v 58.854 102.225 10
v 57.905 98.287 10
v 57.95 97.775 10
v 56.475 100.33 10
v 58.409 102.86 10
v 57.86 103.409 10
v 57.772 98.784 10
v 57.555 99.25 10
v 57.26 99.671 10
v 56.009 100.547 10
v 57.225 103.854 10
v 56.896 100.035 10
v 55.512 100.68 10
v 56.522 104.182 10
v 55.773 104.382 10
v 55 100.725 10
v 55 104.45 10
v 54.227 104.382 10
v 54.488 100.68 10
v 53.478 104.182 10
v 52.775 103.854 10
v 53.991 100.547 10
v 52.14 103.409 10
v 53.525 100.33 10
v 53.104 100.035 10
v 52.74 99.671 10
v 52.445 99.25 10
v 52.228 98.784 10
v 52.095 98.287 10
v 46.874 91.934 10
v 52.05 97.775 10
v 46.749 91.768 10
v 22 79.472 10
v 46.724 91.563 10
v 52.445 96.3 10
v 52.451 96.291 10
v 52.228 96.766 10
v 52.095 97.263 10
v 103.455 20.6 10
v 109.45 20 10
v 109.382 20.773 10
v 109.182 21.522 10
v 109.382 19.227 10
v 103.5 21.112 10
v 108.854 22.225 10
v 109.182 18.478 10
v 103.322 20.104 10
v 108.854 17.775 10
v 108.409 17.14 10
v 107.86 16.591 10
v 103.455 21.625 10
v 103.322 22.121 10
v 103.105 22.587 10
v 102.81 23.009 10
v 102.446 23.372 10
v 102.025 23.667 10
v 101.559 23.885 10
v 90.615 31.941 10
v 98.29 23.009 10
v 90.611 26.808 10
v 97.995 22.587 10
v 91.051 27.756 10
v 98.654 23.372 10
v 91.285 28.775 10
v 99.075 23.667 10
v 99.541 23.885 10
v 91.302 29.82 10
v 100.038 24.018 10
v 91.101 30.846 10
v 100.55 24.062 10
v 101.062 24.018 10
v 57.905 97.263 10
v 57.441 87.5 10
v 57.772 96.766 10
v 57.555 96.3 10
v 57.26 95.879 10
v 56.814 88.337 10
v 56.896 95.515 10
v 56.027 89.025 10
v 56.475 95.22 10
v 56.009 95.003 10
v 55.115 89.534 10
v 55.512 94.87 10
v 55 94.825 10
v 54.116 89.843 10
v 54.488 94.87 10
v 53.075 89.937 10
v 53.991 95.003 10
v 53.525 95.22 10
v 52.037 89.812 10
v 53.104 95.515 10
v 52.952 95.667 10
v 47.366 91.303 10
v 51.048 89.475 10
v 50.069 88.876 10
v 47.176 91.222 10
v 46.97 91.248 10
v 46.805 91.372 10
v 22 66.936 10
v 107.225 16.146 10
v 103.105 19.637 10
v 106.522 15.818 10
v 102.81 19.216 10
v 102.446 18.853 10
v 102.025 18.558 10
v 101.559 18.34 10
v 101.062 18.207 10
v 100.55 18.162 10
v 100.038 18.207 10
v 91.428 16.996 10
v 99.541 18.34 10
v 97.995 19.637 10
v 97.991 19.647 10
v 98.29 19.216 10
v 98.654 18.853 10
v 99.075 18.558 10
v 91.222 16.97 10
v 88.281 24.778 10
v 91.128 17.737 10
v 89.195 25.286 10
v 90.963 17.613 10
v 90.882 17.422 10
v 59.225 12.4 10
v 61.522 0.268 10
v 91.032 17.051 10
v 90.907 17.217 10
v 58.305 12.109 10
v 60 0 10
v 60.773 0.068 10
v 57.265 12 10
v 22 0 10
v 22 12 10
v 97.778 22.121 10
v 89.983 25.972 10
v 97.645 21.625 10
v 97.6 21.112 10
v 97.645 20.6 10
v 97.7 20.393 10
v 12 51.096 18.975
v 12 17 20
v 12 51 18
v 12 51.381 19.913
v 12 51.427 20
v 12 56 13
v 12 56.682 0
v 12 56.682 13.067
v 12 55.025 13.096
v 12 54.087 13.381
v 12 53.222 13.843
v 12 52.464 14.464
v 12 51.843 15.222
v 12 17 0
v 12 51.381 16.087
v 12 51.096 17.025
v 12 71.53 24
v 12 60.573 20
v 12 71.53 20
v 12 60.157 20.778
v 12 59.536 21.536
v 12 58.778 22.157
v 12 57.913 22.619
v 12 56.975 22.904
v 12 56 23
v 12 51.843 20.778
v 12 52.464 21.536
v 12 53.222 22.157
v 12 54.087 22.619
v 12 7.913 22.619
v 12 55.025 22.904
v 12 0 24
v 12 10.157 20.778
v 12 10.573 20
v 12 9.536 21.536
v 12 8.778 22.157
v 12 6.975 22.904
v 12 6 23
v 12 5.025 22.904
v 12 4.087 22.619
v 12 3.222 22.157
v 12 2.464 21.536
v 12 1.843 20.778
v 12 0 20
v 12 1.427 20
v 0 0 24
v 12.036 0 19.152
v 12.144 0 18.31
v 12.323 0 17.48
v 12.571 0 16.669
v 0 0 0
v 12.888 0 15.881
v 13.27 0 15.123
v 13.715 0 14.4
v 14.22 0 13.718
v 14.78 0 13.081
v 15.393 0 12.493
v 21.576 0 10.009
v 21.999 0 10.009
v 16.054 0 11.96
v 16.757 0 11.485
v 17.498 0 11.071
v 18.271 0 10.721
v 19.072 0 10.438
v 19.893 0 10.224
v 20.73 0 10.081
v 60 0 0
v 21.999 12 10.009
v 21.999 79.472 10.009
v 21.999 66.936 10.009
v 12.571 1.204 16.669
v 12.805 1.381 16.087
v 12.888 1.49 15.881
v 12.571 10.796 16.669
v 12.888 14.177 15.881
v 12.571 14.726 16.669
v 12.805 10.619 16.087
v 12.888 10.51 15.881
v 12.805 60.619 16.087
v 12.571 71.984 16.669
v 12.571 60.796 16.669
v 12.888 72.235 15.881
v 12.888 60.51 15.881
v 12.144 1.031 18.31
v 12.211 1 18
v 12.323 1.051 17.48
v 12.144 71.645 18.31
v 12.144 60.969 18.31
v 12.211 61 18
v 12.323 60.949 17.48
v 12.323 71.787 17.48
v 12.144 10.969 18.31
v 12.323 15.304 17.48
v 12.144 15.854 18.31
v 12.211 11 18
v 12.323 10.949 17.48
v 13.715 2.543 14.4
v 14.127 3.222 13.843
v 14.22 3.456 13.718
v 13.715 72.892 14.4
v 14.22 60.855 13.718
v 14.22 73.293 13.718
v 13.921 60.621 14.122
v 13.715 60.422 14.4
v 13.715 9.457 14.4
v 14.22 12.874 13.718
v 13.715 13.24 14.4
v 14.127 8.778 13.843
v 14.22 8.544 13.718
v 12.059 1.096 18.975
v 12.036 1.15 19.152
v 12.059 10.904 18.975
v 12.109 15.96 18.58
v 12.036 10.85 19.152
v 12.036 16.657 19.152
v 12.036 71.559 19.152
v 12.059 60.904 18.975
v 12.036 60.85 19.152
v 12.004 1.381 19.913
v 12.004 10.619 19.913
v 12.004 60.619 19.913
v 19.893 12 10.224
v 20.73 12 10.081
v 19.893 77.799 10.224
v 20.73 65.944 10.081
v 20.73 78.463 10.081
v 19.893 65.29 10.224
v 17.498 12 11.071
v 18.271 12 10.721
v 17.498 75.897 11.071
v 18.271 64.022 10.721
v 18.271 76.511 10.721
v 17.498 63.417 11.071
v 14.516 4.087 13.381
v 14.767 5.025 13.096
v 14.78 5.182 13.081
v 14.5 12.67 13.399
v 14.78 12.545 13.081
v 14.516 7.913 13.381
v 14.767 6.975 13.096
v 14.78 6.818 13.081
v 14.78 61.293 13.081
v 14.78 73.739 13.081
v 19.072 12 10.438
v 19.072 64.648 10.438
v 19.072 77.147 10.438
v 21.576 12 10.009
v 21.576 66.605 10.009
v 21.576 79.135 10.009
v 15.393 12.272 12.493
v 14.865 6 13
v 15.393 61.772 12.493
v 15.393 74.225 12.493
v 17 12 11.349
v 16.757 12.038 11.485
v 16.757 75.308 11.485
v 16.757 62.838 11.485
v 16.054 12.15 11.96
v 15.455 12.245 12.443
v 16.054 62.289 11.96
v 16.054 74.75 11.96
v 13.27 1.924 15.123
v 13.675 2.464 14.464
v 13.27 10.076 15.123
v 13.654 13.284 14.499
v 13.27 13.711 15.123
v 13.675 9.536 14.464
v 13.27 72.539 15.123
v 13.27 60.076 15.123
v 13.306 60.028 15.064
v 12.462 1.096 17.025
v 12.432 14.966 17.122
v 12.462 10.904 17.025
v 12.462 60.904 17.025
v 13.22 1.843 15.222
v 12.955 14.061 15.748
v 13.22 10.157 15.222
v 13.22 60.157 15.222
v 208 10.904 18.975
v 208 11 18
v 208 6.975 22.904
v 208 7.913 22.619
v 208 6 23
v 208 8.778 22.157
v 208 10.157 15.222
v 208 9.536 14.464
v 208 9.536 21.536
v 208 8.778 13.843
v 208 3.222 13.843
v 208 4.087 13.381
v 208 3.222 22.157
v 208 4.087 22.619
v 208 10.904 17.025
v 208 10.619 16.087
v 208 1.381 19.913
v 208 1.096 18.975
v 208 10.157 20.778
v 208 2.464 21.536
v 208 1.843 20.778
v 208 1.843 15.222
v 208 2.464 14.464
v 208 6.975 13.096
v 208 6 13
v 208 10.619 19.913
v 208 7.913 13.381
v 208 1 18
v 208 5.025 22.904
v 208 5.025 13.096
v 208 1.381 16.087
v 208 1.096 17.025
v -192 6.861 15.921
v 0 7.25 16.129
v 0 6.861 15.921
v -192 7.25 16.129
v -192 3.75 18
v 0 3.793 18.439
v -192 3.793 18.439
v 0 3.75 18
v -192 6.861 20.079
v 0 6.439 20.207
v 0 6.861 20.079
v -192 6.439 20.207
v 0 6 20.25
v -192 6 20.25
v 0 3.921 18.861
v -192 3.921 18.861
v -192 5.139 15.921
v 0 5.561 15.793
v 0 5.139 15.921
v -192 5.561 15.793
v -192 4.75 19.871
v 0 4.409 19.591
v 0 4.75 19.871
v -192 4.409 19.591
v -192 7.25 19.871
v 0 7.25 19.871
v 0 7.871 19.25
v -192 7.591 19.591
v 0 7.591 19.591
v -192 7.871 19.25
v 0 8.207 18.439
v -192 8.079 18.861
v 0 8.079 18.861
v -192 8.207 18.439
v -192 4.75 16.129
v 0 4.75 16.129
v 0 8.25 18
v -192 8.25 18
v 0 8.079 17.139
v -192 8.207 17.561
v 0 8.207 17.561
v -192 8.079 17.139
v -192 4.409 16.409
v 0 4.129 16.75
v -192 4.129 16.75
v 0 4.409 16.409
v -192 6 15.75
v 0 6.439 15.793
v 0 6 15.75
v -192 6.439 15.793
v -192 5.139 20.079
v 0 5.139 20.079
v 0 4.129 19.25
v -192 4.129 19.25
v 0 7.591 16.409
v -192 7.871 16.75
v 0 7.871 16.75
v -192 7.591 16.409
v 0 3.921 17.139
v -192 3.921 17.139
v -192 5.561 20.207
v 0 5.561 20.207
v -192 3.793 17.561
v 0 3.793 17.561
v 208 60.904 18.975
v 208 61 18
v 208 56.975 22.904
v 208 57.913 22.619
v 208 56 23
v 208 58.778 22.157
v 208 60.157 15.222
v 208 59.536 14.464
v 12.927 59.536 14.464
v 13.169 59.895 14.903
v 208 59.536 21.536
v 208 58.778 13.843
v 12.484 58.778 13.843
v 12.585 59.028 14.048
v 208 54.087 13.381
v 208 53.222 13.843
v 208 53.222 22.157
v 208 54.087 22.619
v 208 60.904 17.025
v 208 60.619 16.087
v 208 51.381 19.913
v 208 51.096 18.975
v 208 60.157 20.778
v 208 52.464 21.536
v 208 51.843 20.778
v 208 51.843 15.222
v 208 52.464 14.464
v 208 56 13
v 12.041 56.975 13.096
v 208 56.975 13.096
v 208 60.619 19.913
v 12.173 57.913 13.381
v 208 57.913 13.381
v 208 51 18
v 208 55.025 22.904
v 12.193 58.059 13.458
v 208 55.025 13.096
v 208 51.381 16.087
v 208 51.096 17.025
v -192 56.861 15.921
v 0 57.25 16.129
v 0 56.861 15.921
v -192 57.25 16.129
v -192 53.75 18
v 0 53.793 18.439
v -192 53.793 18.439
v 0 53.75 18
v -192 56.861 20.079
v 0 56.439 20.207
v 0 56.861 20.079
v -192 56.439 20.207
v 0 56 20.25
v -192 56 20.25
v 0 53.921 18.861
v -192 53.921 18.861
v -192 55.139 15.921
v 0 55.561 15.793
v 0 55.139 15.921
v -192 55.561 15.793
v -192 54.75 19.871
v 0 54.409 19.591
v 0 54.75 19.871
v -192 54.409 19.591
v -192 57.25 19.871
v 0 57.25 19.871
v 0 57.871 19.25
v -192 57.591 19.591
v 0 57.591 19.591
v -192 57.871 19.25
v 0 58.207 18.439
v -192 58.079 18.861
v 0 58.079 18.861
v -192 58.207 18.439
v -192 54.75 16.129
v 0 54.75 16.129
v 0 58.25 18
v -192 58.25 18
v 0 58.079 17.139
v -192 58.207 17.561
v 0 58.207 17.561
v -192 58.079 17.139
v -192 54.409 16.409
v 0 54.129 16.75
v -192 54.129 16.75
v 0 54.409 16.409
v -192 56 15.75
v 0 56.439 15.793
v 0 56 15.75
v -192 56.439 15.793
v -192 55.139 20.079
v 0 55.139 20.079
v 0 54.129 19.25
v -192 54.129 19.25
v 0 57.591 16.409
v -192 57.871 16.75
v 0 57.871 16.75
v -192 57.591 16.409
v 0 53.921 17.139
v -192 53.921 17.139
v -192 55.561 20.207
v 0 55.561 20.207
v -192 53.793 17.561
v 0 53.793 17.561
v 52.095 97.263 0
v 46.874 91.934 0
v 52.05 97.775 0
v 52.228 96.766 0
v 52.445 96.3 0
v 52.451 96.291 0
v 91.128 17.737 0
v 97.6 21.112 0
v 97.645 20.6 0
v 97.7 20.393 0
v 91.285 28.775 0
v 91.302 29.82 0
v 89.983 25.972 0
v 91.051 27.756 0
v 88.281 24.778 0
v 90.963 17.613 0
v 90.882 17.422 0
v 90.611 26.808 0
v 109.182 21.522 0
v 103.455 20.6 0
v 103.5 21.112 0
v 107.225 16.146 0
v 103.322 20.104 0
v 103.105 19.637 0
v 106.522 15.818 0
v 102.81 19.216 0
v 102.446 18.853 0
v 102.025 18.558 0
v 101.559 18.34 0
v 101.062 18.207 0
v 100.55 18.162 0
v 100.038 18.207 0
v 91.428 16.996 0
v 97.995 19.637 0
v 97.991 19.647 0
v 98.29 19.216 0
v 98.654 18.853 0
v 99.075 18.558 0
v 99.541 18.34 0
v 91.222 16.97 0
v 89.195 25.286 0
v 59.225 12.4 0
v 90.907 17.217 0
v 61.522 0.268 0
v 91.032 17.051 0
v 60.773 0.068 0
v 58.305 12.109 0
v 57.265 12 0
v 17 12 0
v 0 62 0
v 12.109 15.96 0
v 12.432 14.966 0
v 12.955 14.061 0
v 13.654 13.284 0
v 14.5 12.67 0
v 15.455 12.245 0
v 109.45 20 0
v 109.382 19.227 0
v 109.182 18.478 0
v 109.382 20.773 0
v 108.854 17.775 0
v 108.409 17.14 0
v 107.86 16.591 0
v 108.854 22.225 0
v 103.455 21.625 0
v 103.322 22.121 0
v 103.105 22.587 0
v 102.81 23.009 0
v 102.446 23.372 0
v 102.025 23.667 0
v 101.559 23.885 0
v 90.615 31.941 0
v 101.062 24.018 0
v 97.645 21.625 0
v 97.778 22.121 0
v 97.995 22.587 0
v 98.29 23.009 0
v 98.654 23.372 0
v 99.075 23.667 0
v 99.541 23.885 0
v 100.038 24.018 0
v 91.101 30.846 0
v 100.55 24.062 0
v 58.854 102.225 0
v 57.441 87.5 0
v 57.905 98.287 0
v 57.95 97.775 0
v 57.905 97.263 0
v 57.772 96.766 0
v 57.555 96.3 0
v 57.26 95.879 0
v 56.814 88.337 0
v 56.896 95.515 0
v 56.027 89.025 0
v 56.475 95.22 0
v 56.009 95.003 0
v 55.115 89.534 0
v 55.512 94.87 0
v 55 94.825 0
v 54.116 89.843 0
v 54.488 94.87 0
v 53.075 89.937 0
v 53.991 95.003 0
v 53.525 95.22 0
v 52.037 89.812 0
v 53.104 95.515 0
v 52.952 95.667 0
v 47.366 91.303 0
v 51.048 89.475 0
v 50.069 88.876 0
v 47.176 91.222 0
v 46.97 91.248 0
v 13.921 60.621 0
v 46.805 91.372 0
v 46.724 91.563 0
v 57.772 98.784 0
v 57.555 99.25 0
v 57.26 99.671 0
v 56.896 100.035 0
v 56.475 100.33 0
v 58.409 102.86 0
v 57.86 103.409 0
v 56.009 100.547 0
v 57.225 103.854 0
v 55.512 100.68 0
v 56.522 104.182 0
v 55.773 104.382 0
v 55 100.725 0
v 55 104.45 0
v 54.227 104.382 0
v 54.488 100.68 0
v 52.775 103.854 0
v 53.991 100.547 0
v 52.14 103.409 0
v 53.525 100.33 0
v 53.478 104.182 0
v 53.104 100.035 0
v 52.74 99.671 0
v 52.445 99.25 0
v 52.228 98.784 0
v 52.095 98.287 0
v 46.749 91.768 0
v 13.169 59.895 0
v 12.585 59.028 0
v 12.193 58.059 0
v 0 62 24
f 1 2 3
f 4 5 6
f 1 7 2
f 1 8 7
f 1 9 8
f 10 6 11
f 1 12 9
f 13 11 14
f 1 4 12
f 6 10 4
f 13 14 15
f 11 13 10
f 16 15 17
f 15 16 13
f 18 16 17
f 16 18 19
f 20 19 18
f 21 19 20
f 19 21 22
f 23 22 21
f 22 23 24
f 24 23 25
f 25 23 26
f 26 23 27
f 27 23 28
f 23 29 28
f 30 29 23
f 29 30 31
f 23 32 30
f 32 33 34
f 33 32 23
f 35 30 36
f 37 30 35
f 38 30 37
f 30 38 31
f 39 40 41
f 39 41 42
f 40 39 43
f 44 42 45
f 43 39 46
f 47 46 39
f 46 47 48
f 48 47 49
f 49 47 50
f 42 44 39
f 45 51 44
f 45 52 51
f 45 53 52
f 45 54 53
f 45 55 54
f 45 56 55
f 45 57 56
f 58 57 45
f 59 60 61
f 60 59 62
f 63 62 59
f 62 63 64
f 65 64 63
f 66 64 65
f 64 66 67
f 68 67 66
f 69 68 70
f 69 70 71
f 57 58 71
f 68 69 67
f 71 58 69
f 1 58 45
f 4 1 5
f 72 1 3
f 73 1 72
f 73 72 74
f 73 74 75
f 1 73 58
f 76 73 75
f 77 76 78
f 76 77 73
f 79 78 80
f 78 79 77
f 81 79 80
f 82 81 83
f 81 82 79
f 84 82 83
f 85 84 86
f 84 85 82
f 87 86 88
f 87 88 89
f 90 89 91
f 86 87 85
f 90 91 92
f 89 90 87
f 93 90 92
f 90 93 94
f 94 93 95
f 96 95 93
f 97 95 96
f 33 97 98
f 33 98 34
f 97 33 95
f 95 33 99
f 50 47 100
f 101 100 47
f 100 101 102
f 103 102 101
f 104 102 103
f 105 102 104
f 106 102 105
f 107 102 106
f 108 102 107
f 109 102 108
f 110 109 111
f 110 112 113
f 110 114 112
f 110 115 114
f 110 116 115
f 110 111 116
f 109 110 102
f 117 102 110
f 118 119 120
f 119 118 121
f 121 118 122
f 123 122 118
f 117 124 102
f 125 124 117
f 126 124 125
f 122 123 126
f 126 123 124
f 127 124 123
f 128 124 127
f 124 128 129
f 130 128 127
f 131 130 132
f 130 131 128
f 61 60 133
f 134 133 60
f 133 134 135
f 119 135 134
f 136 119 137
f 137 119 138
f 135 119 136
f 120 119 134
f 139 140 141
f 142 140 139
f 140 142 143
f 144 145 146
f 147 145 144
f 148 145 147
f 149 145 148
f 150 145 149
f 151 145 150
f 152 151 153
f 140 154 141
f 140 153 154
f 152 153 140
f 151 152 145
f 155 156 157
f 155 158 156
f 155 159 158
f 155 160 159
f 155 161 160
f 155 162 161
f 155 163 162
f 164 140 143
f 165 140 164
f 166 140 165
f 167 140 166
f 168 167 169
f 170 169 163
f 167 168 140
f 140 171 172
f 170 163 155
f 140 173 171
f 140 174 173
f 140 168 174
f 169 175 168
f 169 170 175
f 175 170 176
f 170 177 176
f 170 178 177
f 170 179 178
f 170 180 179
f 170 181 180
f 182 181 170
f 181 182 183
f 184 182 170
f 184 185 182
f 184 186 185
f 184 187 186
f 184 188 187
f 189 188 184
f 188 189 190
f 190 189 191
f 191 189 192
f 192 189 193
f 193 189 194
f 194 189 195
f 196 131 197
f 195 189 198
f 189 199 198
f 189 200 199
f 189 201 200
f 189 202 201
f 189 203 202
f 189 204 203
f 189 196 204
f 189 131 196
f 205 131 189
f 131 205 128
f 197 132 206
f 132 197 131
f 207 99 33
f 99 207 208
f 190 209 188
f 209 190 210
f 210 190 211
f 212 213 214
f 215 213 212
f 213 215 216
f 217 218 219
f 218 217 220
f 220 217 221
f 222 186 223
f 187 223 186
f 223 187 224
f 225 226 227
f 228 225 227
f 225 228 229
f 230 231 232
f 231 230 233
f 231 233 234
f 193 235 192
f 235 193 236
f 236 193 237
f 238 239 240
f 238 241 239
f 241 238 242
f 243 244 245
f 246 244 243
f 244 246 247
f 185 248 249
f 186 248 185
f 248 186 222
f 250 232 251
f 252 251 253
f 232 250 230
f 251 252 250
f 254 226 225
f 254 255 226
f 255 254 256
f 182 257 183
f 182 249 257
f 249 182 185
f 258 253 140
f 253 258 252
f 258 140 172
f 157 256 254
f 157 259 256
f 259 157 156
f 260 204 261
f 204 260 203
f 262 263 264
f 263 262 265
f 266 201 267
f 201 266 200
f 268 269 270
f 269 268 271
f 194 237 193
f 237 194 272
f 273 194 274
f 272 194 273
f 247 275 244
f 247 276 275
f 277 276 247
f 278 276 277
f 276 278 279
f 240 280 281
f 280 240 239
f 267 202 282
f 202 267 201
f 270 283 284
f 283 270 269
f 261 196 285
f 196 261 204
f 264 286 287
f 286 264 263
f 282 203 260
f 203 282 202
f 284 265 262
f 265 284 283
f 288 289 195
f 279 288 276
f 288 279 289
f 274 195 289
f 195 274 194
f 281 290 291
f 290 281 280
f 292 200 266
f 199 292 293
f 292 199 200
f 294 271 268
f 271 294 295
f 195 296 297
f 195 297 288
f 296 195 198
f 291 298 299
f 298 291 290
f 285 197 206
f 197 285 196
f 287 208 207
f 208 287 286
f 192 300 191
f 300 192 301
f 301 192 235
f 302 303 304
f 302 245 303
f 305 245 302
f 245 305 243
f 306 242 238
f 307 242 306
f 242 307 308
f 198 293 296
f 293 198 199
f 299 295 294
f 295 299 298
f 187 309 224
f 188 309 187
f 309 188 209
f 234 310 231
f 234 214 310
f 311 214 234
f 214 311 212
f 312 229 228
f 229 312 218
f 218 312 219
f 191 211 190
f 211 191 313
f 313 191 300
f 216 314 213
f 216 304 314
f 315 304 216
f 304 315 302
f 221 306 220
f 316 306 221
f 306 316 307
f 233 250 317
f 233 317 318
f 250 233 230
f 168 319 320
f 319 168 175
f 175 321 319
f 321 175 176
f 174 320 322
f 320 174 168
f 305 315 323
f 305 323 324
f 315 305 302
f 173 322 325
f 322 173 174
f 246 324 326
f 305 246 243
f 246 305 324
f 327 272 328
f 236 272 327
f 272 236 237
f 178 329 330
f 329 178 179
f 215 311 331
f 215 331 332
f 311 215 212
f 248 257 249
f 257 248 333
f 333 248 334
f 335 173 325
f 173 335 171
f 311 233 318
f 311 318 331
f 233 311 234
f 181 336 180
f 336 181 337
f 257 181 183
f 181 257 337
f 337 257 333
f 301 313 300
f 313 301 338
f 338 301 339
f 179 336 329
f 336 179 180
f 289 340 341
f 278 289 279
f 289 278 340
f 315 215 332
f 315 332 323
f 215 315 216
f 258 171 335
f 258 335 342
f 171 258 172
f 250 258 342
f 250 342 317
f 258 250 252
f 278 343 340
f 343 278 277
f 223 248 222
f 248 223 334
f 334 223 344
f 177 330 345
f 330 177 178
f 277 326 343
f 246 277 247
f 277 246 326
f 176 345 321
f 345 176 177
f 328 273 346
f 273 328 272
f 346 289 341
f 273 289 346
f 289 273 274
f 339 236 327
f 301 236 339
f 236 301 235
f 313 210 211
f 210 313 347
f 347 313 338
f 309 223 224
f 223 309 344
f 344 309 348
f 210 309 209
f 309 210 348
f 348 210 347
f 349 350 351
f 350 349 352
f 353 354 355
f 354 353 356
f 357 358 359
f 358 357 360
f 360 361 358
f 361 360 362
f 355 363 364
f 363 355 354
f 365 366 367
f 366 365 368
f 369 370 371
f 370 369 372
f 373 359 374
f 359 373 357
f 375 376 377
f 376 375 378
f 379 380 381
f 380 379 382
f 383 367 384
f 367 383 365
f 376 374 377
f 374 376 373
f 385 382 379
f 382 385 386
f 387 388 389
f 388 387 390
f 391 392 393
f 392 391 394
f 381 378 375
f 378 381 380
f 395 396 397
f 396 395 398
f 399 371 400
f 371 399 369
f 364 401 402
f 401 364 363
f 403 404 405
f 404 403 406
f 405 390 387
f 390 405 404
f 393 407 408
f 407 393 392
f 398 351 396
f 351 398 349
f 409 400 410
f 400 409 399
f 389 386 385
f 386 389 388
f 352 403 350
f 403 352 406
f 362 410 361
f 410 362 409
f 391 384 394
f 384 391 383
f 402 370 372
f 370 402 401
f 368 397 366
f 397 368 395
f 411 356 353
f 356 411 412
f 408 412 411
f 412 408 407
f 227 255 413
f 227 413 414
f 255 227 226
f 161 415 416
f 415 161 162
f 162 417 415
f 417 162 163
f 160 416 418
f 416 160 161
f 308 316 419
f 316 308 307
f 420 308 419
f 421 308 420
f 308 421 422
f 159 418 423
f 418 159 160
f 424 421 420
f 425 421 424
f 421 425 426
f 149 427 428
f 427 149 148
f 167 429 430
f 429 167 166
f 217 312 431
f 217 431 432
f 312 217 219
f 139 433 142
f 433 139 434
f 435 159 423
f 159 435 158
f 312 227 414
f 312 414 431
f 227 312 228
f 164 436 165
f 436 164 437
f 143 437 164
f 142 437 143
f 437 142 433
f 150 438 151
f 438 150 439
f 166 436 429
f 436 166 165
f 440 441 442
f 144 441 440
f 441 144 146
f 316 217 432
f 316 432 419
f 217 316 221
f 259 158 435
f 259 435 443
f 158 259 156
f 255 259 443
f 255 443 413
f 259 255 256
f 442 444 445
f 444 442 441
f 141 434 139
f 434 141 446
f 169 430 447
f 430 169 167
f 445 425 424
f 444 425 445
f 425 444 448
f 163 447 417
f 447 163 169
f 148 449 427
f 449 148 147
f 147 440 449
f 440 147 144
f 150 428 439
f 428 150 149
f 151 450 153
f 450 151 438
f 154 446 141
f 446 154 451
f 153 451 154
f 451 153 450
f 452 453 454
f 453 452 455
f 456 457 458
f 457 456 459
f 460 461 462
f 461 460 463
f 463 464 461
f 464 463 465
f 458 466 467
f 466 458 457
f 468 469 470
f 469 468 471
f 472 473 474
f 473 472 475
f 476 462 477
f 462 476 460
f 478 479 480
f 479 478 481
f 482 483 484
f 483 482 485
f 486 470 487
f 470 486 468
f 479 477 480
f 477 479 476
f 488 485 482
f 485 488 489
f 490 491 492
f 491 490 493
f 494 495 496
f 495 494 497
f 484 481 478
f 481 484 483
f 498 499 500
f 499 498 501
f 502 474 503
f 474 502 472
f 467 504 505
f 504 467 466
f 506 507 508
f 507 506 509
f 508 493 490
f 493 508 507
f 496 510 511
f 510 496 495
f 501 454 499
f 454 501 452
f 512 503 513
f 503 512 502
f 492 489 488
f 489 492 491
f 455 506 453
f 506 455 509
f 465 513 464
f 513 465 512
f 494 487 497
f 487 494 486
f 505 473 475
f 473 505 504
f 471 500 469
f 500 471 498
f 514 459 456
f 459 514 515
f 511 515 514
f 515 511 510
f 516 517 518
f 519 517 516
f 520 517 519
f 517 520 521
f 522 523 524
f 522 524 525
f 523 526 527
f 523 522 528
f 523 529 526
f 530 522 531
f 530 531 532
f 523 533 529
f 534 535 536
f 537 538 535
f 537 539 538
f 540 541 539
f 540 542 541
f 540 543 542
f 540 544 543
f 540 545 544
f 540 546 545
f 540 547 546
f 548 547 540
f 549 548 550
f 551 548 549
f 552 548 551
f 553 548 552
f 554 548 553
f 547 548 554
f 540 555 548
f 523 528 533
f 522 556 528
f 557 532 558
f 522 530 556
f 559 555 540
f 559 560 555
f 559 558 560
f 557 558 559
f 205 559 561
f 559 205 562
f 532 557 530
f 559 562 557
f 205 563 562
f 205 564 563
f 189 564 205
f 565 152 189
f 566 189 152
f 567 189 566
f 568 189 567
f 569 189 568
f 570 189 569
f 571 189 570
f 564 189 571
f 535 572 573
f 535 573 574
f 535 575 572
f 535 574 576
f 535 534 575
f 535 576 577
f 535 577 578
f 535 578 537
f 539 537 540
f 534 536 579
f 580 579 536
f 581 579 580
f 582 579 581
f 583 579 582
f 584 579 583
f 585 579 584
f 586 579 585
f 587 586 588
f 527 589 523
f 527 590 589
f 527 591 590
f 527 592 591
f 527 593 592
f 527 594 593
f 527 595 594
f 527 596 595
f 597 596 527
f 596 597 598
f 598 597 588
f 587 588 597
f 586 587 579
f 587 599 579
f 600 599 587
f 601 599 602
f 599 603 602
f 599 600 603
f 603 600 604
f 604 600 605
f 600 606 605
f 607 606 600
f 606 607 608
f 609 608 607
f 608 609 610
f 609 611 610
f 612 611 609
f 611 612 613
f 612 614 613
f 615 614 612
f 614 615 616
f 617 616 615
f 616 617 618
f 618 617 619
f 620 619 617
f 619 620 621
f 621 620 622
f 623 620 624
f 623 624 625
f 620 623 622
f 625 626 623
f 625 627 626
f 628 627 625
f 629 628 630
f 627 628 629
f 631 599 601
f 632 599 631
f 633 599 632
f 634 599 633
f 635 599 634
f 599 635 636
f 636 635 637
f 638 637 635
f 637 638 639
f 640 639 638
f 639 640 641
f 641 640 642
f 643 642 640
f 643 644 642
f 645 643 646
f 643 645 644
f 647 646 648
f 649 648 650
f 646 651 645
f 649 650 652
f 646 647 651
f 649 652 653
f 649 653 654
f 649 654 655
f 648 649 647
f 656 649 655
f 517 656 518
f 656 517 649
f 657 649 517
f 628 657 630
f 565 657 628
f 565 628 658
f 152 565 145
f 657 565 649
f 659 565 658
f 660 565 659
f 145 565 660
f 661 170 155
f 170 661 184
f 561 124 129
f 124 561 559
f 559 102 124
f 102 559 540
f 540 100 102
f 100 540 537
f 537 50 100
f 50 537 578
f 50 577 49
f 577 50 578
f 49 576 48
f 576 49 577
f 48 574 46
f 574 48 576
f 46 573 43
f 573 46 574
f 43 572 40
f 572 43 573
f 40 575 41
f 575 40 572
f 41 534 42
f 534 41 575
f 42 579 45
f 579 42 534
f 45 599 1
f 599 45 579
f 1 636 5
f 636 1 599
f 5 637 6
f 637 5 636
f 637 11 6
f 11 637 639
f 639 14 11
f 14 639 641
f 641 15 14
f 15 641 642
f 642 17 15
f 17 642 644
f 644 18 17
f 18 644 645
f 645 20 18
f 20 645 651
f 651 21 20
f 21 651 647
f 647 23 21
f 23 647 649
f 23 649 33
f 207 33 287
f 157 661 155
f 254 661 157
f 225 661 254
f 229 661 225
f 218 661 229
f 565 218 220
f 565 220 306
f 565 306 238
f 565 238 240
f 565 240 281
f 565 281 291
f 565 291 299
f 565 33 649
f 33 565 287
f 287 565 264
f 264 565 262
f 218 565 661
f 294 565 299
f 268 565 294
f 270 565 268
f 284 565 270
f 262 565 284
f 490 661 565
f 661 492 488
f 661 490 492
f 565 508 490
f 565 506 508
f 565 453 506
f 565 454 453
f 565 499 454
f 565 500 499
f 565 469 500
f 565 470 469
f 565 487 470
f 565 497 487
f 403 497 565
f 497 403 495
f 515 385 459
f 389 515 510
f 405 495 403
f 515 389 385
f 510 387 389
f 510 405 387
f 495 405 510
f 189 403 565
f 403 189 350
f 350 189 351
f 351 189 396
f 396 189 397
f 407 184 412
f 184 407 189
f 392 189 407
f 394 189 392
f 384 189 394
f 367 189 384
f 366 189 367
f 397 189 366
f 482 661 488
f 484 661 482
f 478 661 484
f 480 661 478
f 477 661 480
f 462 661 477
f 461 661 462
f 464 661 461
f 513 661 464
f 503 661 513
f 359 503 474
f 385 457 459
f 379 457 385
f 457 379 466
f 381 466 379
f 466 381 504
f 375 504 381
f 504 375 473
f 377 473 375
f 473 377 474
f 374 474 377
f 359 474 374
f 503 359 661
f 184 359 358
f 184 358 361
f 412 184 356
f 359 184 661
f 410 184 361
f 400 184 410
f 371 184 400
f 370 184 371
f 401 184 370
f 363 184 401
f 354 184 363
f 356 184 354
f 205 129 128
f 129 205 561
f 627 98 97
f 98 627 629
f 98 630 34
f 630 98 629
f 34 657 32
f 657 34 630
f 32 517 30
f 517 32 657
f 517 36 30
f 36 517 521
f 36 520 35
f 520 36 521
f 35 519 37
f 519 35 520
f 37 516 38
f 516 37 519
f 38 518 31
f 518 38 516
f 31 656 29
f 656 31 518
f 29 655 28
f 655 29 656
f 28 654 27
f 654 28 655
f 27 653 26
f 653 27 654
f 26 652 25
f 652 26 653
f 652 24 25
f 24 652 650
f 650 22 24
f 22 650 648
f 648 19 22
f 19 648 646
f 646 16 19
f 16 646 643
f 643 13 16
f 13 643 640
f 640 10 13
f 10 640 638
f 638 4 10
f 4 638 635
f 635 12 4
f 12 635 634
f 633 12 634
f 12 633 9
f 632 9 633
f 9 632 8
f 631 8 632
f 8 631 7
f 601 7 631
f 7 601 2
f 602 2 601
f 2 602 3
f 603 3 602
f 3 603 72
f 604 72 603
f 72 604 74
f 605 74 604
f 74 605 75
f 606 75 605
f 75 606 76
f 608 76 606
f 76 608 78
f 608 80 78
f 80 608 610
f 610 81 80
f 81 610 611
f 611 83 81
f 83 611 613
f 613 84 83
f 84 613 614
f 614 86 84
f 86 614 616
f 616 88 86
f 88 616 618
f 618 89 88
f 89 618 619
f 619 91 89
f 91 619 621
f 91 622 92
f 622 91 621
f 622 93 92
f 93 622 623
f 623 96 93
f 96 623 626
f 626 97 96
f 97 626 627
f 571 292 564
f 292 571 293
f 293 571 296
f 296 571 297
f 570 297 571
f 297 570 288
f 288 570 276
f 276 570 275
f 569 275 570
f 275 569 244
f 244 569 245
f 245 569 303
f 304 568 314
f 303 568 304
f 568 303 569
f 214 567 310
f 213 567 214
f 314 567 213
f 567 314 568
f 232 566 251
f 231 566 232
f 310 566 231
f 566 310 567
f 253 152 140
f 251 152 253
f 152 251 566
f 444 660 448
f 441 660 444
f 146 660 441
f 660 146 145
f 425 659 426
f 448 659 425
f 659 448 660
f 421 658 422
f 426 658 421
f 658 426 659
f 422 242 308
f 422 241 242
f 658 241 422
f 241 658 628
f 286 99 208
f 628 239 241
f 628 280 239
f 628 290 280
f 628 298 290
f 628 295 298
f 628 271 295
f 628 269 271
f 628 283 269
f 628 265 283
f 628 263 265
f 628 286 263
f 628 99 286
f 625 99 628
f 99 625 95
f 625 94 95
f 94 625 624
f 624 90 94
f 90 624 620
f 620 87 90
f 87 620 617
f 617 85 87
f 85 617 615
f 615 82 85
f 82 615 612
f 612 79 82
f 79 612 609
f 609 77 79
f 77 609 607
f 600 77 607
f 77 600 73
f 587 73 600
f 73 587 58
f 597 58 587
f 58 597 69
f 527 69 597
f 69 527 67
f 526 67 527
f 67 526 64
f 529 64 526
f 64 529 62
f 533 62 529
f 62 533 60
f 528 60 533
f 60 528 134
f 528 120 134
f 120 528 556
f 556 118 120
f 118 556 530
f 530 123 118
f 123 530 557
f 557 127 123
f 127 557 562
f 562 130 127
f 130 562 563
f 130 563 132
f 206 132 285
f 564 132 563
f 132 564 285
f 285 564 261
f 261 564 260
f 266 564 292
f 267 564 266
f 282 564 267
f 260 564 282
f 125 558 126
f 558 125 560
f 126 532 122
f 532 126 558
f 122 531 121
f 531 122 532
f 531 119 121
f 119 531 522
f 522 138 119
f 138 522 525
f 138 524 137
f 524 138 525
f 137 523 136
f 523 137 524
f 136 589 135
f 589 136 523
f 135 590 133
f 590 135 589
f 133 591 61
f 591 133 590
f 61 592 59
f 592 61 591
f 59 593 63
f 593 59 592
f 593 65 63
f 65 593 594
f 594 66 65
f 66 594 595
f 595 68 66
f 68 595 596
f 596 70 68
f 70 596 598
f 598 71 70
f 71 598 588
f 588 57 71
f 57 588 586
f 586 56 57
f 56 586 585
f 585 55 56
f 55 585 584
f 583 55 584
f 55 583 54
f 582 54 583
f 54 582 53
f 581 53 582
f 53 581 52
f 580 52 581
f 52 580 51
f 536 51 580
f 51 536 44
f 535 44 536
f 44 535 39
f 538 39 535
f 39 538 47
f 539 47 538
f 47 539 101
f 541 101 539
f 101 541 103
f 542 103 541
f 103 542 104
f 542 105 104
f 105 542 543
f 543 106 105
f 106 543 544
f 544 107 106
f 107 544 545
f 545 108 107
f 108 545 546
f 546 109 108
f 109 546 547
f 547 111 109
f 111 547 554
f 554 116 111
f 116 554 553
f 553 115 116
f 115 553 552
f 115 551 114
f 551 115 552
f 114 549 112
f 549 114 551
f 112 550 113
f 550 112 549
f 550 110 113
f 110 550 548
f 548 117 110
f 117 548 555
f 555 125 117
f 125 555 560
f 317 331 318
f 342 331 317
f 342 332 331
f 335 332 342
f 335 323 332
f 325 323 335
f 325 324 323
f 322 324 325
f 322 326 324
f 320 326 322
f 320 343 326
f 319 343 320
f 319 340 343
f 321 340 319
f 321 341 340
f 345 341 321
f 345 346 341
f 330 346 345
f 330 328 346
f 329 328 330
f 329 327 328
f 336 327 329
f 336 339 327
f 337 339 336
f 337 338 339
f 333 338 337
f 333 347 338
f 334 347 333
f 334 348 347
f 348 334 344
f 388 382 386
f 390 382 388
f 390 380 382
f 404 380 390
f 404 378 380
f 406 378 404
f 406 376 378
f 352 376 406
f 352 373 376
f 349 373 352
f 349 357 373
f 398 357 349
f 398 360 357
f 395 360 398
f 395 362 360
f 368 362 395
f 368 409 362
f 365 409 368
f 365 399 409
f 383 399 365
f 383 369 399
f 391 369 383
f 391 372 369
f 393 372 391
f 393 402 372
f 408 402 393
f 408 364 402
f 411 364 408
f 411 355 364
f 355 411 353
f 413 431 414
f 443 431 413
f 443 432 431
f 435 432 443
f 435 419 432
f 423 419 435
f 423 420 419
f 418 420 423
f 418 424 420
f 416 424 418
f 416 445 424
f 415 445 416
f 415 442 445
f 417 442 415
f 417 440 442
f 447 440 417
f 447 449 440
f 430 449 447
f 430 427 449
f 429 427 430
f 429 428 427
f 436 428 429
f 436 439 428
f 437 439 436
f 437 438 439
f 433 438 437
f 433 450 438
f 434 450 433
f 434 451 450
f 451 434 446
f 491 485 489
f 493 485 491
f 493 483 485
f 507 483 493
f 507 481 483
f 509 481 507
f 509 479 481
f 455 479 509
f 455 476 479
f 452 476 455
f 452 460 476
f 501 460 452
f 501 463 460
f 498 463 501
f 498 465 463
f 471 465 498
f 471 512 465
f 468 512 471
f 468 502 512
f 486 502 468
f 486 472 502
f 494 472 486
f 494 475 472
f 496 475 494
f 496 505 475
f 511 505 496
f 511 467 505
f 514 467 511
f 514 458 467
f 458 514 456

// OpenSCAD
// * Discription what the *.scad is about ect.

// ==================================
// = Used Libraries =
// ==================================

// ==================================
// = Variables =
// ==================================

/* [Tab Name_1] */
// sizing printing or print a small part to test the object.
DesignStatus="sizing"; // ["sizing","fitting","printing"]
// Variables seen by customizer

HeightBaseSchape=50;
WidthBaseSchape=60;
Thicknes=12;

OutstandRest_Height=100;
OutstandRest_Width=55;
OutStand=105;
OutStand_UpRise=20;

Pipe_D=5.9;
Pipe_R_Offset=3;

TestSlab_X=50;
TestSlab_Y=100;
TestSlab_Z=30;

/* [Tab Name_2] */
TestCylinder_H=35;
TestCylinder_D1=25;
TestCylinder_D2=45;

TestSphere_D=42;

module __Customizer_Limit__ () {}  // before these, the variables are usable in the cutomizer
shown_by_customizer = false;


Circle_D=Pipe_D+Pipe_R_Offset;

Invisible=42;
TestslabTransl_X=25;
TestslabRotate_X=30;

// === Facettes Numbers ===

FN_HexNut=6;
FN_Performance=36;
FN_FooBaa=12;
// Divisebile by 4 to align Cylinders whithout small intersections taht cause problems due to smal holes in surfaches and self intersections on round objects

FN_Rough=12;
FN_MediumRough=16;
FN_Medium=36;
FN_Fine=72;
FN_ExtraFine=144;
// ==================================
// = Tuning Variables =
// ==================================
// Variables for finetuning (The Slegehammer if something has to be made fit)

// ==================================
// = Customizer Section =
// ==================================
if (DesignStatus=="printing"){
    Main_Assembly(36,76,"false");
    mirror([0,1,0]){
        translate([0,1,0]){
            Main_Assembly(36,76,"false");}
        }
}
if(DesignStatus=="fitting"){
    intersection(){                                 // Flat Shape
        translate([0,0,0]){
            #cube([1000,1000,0.4],center=true);
        }
        Main_Assembly(16,76,"false");
    }
    intersection(){                                 // Flat Shape
        translate([OutstandRest_Width,OutstandRest_Height,0]){
            rotate([0,0,300]){
                #cube([45,20,30],center=true);
            }
        }
        Main_Assembly(16,76,"false");
    }
}
if (DesignStatus=="sizing"){
    Main_Assembly(16,36,"true");
}
// ==================================
// = MAINASSEMBLY =
// ==================================
// LOW_RESOLUTION: low reaulution value to speed up preview
// HIGH_RESOLUTION: high resolution value for rendering the .stl
// CUT_MODULES_RENDERED: decides if the cuttingmodules get renderred to see them. use cuttingmodules twice one time within the final part to cut and one time to just schow it.
// Main_Assembly(12,76,true);
module Main_Assembly(LOW_RESOLUTION=12,HIGH_RESOLUTION=36,CUT_MODULES_RENDERED){
$fn = $preview ? LOW_RESOLUTION : HIGH_RESOLUTION ; // Facets in preview (F5) set to 12, in Reder (F6) is set to 36 "as default" or else if variable contians a value
    see_me_in_colourful(){
        translate([0,0,0]){
            difference(){
                LinExtr_Base_Shape_Poligon();
                translate([Thicknes,0,10]){
                    Round_CUTTER(300,20);                
                }
                translate([0,0,Thicknes*2-Thicknes/2]){
                    translate([Thicknes-Thicknes/3,Thicknes/2,0]){
                        rotate([0,-90,0]){
                            #Screwcutter();
                        }
                    }
                    translate([Thicknes-Thicknes/3,HeightBaseSchape+Thicknes/2,0]){
                        rotate([0,-90,0]){
                            #Screwcutter();
                        }
                    }
                }
            }
        }
        translate([0,0,0]){
            
        }        
        translate([0,0,0]){
            difference(){
                //TEST_SPHERE();
                
            }
        }
        translate([0,0,0]){
            
        }
        translate([0,0,0]){
            if(CUT_MODULES_RENDERED=="true"){
                translate([Thicknes,0,10]){
                    //Round_CUTTER(300,20);                
                }
                translate([0,0,Thicknes*2-Thicknes/2]){
                    translate([Thicknes-Thicknes/3,Thicknes/2,0]){
                        rotate([0,-90,0]){
                            #Screwcutter();
                        }
                    }
                    translate([Thicknes-Thicknes/3,HeightBaseSchape+Thicknes/2,0]){
                        rotate([0,-90,0]){
                            #Screwcutter();
                        }
                    }
                }
                //TEST_CUTCYLINDER();
            }
            else{
                echo("CUT_MODULES_RENDERED= ",CUT_MODULES_RENDERED);
            }
        }
        union(){
            
        }
        translate([ 0,0,0]){
        }
    }
}
// ===============================================================================
// = Module to help coloring different modules to make it easier 
// ===============================================================================
module see_me_in_colourful(){ // iterates the given modules and colors them automaticly by setting values using trigonometric funktions
    translate([0,0,0]){
        for(i=[0:1:$children-1]){
            a=255;
            b=50;       // cuts away the dark colors to prevent bad visual contrast to backgound
            k_farbabstand=((a-b)/$children);
            Farbe=((k_farbabstand*i)/255);
            SINUS_Foo=0.5+(sin(((360/(a-b))*k_farbabstand)*(i+1)))/2;
            COSIN_Foo=0.5+(cos(((360/(a-b))*k_farbabstand)*(i+1)))/2;
            color(c = [ SINUS_Foo,
                        1-(SINUS_Foo/2+COSIN_Foo/2),
                        COSIN_Foo],
                        alpha = 0.5){  
                difference(){
                    render(convexity=10){children(i);} //renders the modules, effect is that inner holes become visible
                    //children(i);
                    translate([70/2,0,0]){
                        //cube([80,90,150],center=true);
                    }
// Creates a Cutting to see a Sidesection cut of the objects
                    color(c = [ SINUS_Foo,
                                1-(SINUS_Foo/2+COSIN_Foo/2),
                                COSIN_Foo],
                                alpha = 0.0){
                        translate([70/2,0,0]){
                            //cube([30,20,150],center=true);
                        }
                        translate([-50,-50,0]){
                            //cube([100,50,200],center=false);
                        }
                    }
                }
            }
        }
    }
}
// ===============================================================================
// =--------------------------------- Enviroment Modules ------------------------=
// ===============================================================================
// Modules that resembles the Enviroment aka the helmet where to atach a camera mount



// ===============================================================================
// =--------------------------------- Modules -----------------------------------=
// ===============================================================================
//TEST_OBJECT();

module TEST_OBJECT(){
    difference(){
        TEST_CUTCUBE(TestSlab_X,TestSlab_Y,TestSlab_Z);
        TEST_CUTCYLINDER();
    }
    TEST_SPHERE();
}

module TEST_CUTCUBE(X=30,Y=60,Z=15){
    cube([X,Y,Z]);
}
module TEST_SPHERE(D=TestSphere_D){
//$fn = $preview ? 12 : 72; // Facets in preview (F5) set to 12, in Reder (F6) is set to 72
    difference(){
        sphere(d=D);
        TEST_CUTCYLINDER();
    }
}
module TEST_CUTCYLINDER(H=TestCylinder_H,D1=TestCylinder_D1,D2=TestCylinder_D2){
    cylinder(h=H,d1=D1,d2=D2,$fn=24);
}

// ===============================================================================
// ---------------------------------- Cutting Modules ----------------------------
// ===============================================================================
//Press_Fit_Cut(33,14,17,0.8);
module Press_Fit_Cut(Angle=22,Thickness=11,Length=22,Width=0.2){
    rotate([0,0,Angle]){
        translate([0,0,Thickness/2]){
            cylinder(h=Thickness,d=Width,center=true,$fn=12);
        }
        translate([0,-Width/2,0]){
            cube([Length,Width,Thickness]);
        }
        translate([Length,0,Thickness/2]){
            cylinder(h=Thickness,d=Width,center=true,$fn=12);
        }
    }
}

//Round_CUTTER(H,DIAMETER);
module Round_CUTTER(H,DIAMETER){
    difference(){
        cube([H,H,H]);
            rotate([-90,0,0]){
                cylinder(h=H,d=DIAMETER);
            }
        }        
        translate([DIAMETER/2,0,DIAMETER/2]){
            rotate([-90,0,0]){
                cylinder(h=H,d=DIAMETER,$fn=74);
        }
    }
}
//Screwcutter(100,10,100,4,1,5);
module Screwcutter( SCREW_HEAD_h=200,
                    SCREW_HEAD_d=10,
                    SCREW_BOLT_h=200,
                    SCREW_BOLT_d=4.5,
                    SCREW_CAMPFER_h,
                    SCREW_CAMPFER_d=5    ){
    translate([0,0,-SCREW_HEAD_h]){
        cylinder(h=SCREW_HEAD_h,d=SCREW_HEAD_d,$fn=32);
    }
    translate([0,0,0]){
        cylinder(h=SCREW_CAMPFER_h,d2=SCREW_BOLT_d,d1=SCREW_CAMPFER_d,$fn=32);    
    }
    translate([0,0,0]){
        cylinder(h=SCREW_BOLT_h,d=SCREW_BOLT_d,$fn=32);
    }
}
//Bolt(25,3,8,3);
module Bolt(BOLTLENGTH,BOLTDIAMETER,HEADDIAMETER,HEADHEIGHT){
    cylinder(h=BOLTLENGTH,d=BOLTDIAMETER,center=false,$fn=FN_Performance);
    translate([0,0,-HEADHEIGHT/2]){
        cylinder(h=HEADHEIGHT,d=HEADDIAMETER,center=true,$fn=6);
        cylinder(h=HEADHEIGHT,d=HEADDIAMETER,center=true,$fn=6);
    }
}
//Projection_Cutter(3){sphere(10);};
module Projection_Cutter(Offset_z){    
    projection(cut = true){
        translate([0,0,Offset_z]){
            children();
        }
    }
}
// ===============================================================================
// ---------------------------------- Intersection Modules -----------------------
// ===============================================================================

module Intersection_Test_Cut(PLAIN,THICKNESS,OFFSET){
// ==== EXAMPLE ====
//    !Intersection_Test_Cut("xy",1,7/2){sphere(7);};
// ==== EXAMPLE ====
    if (PLAIN=="xz"){
        intersection(){
            children();
            translate([0,OFFSET,0]){
                cube([100,THICKNESS,100],center=true);
            }
        }
    }
    else if (PLAIN=="xy") {
        intersection(){
            children();
            translate([0,0,OFFSET]){
                cube([500,500,THICKNESS],center=true);
            }
        }
    }
    else if (PLAIN=="yz") {
        intersection(){
            children();
            translate([OFFSET,0,0]){
                cube([THICKNESS,100,100],center=true);
            }
        }   
    }
}
// ===============================================================================
// ---------------------------------- Linear Extrude Modules ---------------------
// ===============================================================================
//LinExtr_Base_Shape_Poligon();
module LinExtr_Base_Shape_Poligon(){
    linear_extrude(Thicknes*2){
        Base_Shape_Poligon();
    }
}
//Ring_Shaper(3,15,1.5);
module Ring_Shaper(HEIGHT,OUTER,WALLTHICKNESS){
    linear_extrude(HEIGHT){
        2D_Ring_Shape(OUTER,WALLTHICKNESS);
    }
}
//Linear_Extruding(10,-1){2D_Rounded_Square_Base_Shape(10,20,3);}
module Linear_Extruding(ExtrudeLength,ExrtudingDirektionInverter){
//   0  Normal
//  -1  inverted
//   1  
    Length=ExtrudeLength;
    translate([0,0,Length*ExrtudingDirektionInverter]){
        linear_extrude(height=ExtrudeLength){
            children();
        }
    }
}

// ===============================================================================
// ---------------------------------- Rotate Extrude Modules ---------------------
// ===============================================================================

//DONUT(1,20,1,7);
module DONUT(DIAMETER,DIAMETER_RING,SCAL_X,SCAL_Y){
//DIAMETER The dough part
//DIAMETER_RING The hole part
//SCAL_X, skales the x dimension
//SCAL_Y, skales the y dimension
    rotate_extrude(angle=360,convexity=3,$fn=FN_Fine){
        translate([DIAMETER_RING,0,0]){
            scale([SCAL_X,SCAL_Y,1]){
                circle(d=DIAMETER,$fn=FN_Fine);
            }
        }
    }
}
// ===============================================================================
// =--------------------------------- 2D-Shapes ---------------------------------=
// ===============================================================================
// Base_Shape_Poligon();
module Base_Shape_Poligon(){
    difference(){
        hull(){
            square([WidthBaseSchape,HeightBaseSchape]);
            square([Thicknes,HeightBaseSchape+Thicknes]);
            translate([OutstandRest_Width,OutstandRest_Height,0]){
                #circle(d=Circle_D);
            }
            translate([OutStand,OutStand_UpRise,0]){
                circle(d=Circle_D);
            }
            translate([WidthBaseSchape,Circle_D/2,0]){
                circle(d=Circle_D);
            }
        }
        translate([Thicknes,Thicknes]){
            Base_Shape_Poligon_Cut();
        }
        translate([OutstandRest_Width,OutstandRest_Height-Circle_D/4,0]){
                circle(d=Pipe_D);
                projection(cut=true){Press_Fit_Cut(218,14,10,0.8);}
            }
        translate([OutStand-Circle_D/2,OutStand_UpRise+Circle_D/8,0]){
            circle(d=Pipe_D);
            projection(cut=true){Press_Fit_Cut(202,1,10,0.8);}
        }
    }
}

//Base_Shape_Poligon_Cut();
module Base_Shape_Poligon_Cut(){
ROUNDER=5;
X_SCALE=((OutStand)-2*Thicknes)/(OutStand);
Y_SCALE=(OutstandRest_Height-2*Thicknes)/OutstandRest_Height;
    Smooth(r=ROUNDER){
        scale([X_SCALE,Y_SCALE]){
            hull(){
                square([WidthBaseSchape,HeightBaseSchape]);
                square([Thicknes,HeightBaseSchape+Thicknes]);
                translate([OutstandRest_Width,OutstandRest_Height+ROUNDER,0]){
                    #circle(d=1);
                }
                translate([OutStand,OutStand_UpRise,0]){
                    circle(d=1);
                }
                translate([WidthBaseSchape,Circle_D/2,0]){
                    circle(d=1);
                }
            }
        }
    }
}
//2D_Ring_Shape(202,1);
module 2D_Ring_Shape(OUTER_D,WALLTHICKNESS){
    difference(){
        circle(d=OUTER_D,$fn=FN_Fine);
        circle(d=OUTER_D-2*WALLTHICKNESS,$fn=FN_Fine);
    }
}
//2D_Rounded_Square_Base_Shape(10,20,3);
module 2D_Rounded_Square_Base_Shape(DIMENSION_X=10,DIMENSION_Y=20,RADIUS=2,CENTER=true){
    if(CENTER){
        translate([0,0,0]){
            minkowski(){
                square([DIMENSION_X-RADIUS*2,DIMENSION_Y-RADIUS*2],center=CENTER);
                circle(r=RADIUS,$fn=FN_Fine);
            }
        }
    }
    else{
        translate([RADIUS,RADIUS,0]){
            minkowski(){
                square([DIMENSION_X-RADIUS*2,DIMENSION_Y-RADIUS*2],center=CENTER);
                circle(r=RADIUS,$fn=FN_Fine);
            }
        }
    }
}
//HEX_Mesh_Pattern(){ Mesh(2.5,2.5);}
module HEX_Mesh_Pattern(X=10,Y=30,DELTA=5,GRPL_X=45,GRPL_Y=115){
Count_X=X;
Count_Y=Y;
DIMENSION_X=35;
DIMENSION_Y=67;


//DELTA=1;

X_STEPP=5.5+DELTA;
Y_STEPP=7.5+DELTA;

k=DELTA; //Distance between Hexshapes may be HEX_D/4 is good
HEX_D=(DIMENSION_X-((Count_X-1)*k/2))/(Count_X-1);

SCALE_Y=DIMENSION_Y/((HEX_D/2+k/4)*sqrt(3)*(Count_Y-1));
echo("HEX_D*Count_Y",HEX_D*(Count_Y));
echo("GrindingPlate_Y",DIMENSION_Y);
echo("SCALE_Y",SCALE_Y);

//square([15,(HEX_D/2+k/4)*sqrt(3)*(Count_Y-1)]); // Helper Foo
    
// +++++++++++++++++++++++++++++++++++++++++
    scale([1,SCALE_Y,1]){
        union(){
            for(j=[0:1:Count_Y-1]){
                for(i=[0:1:Count_X-1-j%2]){
                    translate([i*(HEX_D+k/2),0,0]){
                        translate([(HEX_D/2+k/4)*(j%2),
                                    j*((HEX_D/2+k/4)*sqrt(3)),
                                    0]                          ){
                        //translate([0,j*Y_STEPP,0]){
                        rotate([0,0,60]){
                            //Mesh(0.5){square([HEX_D,HEX_D*1.2],center=true);}
                            circle(d=HEX_D,$fn=6);
                        }
                            //children();
                        }
                    }
                }
            }
        }
    }
}
//Mesh(4){square([7,10],center=true);}
module Mesh(RADIUS=0.0){
minkowski(){
    children();
    circle(r=RADIUS,$fn=144);
    }
}
// ===============================================================================
// =--------------------------------- Symetrie Helper ---------------------------=
// ===============================================================================
//XY_Symetrie(10,25){cube(10);}
module XY_Symetrie(X=10,Y=25){
   translate([X,Y,0]){
       children();
       }
    mirror([1,0,0]){
        translate([X,Y,0]){
            children();
       }
    }
    mirror([0,1,0]){
        translate([X,Y,0]){
            children();
        }
        mirror([1,0,0]){
            translate([X,Y,0]){
                children();
            }
        }
    }
}
//MirrorMirrorOnTheWall(27,65){cube(10);}
module MirrorMirrorOnTheWall(Offset_X,Offset_Y){
    translate([-Offset_X,Offset_Y,0]){
        children();
        mirror([0,1,0]){
            children();
        }
    }
    translate([Offset_X,-Offset_Y,0]){
        mirror([1,0,0]){
            children();
            mirror([1,0,0]){
                children();
            }
        }
    }
}
// ===============================================================================
// =--------------------------------- Textembossing -----------------------------=
// ===============================================================================

// ===============================================================================
// =--------------------------------- Smoothing ---------------------------------=
// ===============================================================================
2D_Smooth_r=1;
// Radius of a outer Tip Rounding 
2D_Fillet_r=1;
// Radius of a inner corner Ronding
2D_Chamfer_DELTA_INN=1;
2D_Chamfer_DELTA_OUT=2;
// a straigt line on edges and corners
2D_Chamfer_BOOLEAN=false;    
module Smooth(r=3){
    //$fn=30;
    offset(r=r,$fn=30){
        offset(r=-r,$fn=30){
        children();
        }
    }
}
module Fillet(r=3){
    //$fn=30;
    offset(r=-r,$fn=30){
        offset(r=r,$fn=30){
            children();
        }
    }
}
module Chamfer_OUTWARD(DELTA_OUT=3){
    //$fn=30;
    offset(delta=DELTA_OUT,chamfer=true,$fn=30){
        offset(delta=-DELTA_OUT,chamfer=true, $fn=30){
            children();
        }
    }
}
module Chamfer_INWARD(DELTA_INN=3){
    //$fn=30;
    offset(delta=-DELTA_INN,chamfer=true,$fn=30){
        offset(delta=DELTA_INN,chamfer=true, $fn=30){
            children();
        }
    }
}
// ===============================================================================
// =--------------------------------- Ruthex --------------------------------=
// ===============================================================================
// Dimensions for Ruthex Tread inseerts
//RUTHEX_M3();
module RUTHEX_M3(){    
L=5.7+5.7*0.25; // Length + Margin
echo("RUTHEX",L);
D1=4.0;    
    translate([0,0,0]){
        rotate([0,0,0]){
            translate([0,0,0]){
                cylinder(h=L,d1=D1,d2=D1,$fn=FN_Performance);
            }
        }
    }
}
// ===============================================================================
// =--------------------------------- Import STL --------------------------------=
// ===============================================================================
module NAME_OF_IMPORT(){
    rotate([0,0,-90]){
        translate([-515,-100,-45]){
            import("PATH/TO/FILE.stl",convexity=3);
        }
    }
}
// ===============================================================================
// =--------------------------------- Import PNG --------------------------------=
// ===============================================================================
module NAME_OF_IMPORT(){
    rotate([0,0,-90]){
        translate([-515,-100,-45]){
            import("PATH/TO/FILE.PNG",convexity=3);
        }
    }
}
